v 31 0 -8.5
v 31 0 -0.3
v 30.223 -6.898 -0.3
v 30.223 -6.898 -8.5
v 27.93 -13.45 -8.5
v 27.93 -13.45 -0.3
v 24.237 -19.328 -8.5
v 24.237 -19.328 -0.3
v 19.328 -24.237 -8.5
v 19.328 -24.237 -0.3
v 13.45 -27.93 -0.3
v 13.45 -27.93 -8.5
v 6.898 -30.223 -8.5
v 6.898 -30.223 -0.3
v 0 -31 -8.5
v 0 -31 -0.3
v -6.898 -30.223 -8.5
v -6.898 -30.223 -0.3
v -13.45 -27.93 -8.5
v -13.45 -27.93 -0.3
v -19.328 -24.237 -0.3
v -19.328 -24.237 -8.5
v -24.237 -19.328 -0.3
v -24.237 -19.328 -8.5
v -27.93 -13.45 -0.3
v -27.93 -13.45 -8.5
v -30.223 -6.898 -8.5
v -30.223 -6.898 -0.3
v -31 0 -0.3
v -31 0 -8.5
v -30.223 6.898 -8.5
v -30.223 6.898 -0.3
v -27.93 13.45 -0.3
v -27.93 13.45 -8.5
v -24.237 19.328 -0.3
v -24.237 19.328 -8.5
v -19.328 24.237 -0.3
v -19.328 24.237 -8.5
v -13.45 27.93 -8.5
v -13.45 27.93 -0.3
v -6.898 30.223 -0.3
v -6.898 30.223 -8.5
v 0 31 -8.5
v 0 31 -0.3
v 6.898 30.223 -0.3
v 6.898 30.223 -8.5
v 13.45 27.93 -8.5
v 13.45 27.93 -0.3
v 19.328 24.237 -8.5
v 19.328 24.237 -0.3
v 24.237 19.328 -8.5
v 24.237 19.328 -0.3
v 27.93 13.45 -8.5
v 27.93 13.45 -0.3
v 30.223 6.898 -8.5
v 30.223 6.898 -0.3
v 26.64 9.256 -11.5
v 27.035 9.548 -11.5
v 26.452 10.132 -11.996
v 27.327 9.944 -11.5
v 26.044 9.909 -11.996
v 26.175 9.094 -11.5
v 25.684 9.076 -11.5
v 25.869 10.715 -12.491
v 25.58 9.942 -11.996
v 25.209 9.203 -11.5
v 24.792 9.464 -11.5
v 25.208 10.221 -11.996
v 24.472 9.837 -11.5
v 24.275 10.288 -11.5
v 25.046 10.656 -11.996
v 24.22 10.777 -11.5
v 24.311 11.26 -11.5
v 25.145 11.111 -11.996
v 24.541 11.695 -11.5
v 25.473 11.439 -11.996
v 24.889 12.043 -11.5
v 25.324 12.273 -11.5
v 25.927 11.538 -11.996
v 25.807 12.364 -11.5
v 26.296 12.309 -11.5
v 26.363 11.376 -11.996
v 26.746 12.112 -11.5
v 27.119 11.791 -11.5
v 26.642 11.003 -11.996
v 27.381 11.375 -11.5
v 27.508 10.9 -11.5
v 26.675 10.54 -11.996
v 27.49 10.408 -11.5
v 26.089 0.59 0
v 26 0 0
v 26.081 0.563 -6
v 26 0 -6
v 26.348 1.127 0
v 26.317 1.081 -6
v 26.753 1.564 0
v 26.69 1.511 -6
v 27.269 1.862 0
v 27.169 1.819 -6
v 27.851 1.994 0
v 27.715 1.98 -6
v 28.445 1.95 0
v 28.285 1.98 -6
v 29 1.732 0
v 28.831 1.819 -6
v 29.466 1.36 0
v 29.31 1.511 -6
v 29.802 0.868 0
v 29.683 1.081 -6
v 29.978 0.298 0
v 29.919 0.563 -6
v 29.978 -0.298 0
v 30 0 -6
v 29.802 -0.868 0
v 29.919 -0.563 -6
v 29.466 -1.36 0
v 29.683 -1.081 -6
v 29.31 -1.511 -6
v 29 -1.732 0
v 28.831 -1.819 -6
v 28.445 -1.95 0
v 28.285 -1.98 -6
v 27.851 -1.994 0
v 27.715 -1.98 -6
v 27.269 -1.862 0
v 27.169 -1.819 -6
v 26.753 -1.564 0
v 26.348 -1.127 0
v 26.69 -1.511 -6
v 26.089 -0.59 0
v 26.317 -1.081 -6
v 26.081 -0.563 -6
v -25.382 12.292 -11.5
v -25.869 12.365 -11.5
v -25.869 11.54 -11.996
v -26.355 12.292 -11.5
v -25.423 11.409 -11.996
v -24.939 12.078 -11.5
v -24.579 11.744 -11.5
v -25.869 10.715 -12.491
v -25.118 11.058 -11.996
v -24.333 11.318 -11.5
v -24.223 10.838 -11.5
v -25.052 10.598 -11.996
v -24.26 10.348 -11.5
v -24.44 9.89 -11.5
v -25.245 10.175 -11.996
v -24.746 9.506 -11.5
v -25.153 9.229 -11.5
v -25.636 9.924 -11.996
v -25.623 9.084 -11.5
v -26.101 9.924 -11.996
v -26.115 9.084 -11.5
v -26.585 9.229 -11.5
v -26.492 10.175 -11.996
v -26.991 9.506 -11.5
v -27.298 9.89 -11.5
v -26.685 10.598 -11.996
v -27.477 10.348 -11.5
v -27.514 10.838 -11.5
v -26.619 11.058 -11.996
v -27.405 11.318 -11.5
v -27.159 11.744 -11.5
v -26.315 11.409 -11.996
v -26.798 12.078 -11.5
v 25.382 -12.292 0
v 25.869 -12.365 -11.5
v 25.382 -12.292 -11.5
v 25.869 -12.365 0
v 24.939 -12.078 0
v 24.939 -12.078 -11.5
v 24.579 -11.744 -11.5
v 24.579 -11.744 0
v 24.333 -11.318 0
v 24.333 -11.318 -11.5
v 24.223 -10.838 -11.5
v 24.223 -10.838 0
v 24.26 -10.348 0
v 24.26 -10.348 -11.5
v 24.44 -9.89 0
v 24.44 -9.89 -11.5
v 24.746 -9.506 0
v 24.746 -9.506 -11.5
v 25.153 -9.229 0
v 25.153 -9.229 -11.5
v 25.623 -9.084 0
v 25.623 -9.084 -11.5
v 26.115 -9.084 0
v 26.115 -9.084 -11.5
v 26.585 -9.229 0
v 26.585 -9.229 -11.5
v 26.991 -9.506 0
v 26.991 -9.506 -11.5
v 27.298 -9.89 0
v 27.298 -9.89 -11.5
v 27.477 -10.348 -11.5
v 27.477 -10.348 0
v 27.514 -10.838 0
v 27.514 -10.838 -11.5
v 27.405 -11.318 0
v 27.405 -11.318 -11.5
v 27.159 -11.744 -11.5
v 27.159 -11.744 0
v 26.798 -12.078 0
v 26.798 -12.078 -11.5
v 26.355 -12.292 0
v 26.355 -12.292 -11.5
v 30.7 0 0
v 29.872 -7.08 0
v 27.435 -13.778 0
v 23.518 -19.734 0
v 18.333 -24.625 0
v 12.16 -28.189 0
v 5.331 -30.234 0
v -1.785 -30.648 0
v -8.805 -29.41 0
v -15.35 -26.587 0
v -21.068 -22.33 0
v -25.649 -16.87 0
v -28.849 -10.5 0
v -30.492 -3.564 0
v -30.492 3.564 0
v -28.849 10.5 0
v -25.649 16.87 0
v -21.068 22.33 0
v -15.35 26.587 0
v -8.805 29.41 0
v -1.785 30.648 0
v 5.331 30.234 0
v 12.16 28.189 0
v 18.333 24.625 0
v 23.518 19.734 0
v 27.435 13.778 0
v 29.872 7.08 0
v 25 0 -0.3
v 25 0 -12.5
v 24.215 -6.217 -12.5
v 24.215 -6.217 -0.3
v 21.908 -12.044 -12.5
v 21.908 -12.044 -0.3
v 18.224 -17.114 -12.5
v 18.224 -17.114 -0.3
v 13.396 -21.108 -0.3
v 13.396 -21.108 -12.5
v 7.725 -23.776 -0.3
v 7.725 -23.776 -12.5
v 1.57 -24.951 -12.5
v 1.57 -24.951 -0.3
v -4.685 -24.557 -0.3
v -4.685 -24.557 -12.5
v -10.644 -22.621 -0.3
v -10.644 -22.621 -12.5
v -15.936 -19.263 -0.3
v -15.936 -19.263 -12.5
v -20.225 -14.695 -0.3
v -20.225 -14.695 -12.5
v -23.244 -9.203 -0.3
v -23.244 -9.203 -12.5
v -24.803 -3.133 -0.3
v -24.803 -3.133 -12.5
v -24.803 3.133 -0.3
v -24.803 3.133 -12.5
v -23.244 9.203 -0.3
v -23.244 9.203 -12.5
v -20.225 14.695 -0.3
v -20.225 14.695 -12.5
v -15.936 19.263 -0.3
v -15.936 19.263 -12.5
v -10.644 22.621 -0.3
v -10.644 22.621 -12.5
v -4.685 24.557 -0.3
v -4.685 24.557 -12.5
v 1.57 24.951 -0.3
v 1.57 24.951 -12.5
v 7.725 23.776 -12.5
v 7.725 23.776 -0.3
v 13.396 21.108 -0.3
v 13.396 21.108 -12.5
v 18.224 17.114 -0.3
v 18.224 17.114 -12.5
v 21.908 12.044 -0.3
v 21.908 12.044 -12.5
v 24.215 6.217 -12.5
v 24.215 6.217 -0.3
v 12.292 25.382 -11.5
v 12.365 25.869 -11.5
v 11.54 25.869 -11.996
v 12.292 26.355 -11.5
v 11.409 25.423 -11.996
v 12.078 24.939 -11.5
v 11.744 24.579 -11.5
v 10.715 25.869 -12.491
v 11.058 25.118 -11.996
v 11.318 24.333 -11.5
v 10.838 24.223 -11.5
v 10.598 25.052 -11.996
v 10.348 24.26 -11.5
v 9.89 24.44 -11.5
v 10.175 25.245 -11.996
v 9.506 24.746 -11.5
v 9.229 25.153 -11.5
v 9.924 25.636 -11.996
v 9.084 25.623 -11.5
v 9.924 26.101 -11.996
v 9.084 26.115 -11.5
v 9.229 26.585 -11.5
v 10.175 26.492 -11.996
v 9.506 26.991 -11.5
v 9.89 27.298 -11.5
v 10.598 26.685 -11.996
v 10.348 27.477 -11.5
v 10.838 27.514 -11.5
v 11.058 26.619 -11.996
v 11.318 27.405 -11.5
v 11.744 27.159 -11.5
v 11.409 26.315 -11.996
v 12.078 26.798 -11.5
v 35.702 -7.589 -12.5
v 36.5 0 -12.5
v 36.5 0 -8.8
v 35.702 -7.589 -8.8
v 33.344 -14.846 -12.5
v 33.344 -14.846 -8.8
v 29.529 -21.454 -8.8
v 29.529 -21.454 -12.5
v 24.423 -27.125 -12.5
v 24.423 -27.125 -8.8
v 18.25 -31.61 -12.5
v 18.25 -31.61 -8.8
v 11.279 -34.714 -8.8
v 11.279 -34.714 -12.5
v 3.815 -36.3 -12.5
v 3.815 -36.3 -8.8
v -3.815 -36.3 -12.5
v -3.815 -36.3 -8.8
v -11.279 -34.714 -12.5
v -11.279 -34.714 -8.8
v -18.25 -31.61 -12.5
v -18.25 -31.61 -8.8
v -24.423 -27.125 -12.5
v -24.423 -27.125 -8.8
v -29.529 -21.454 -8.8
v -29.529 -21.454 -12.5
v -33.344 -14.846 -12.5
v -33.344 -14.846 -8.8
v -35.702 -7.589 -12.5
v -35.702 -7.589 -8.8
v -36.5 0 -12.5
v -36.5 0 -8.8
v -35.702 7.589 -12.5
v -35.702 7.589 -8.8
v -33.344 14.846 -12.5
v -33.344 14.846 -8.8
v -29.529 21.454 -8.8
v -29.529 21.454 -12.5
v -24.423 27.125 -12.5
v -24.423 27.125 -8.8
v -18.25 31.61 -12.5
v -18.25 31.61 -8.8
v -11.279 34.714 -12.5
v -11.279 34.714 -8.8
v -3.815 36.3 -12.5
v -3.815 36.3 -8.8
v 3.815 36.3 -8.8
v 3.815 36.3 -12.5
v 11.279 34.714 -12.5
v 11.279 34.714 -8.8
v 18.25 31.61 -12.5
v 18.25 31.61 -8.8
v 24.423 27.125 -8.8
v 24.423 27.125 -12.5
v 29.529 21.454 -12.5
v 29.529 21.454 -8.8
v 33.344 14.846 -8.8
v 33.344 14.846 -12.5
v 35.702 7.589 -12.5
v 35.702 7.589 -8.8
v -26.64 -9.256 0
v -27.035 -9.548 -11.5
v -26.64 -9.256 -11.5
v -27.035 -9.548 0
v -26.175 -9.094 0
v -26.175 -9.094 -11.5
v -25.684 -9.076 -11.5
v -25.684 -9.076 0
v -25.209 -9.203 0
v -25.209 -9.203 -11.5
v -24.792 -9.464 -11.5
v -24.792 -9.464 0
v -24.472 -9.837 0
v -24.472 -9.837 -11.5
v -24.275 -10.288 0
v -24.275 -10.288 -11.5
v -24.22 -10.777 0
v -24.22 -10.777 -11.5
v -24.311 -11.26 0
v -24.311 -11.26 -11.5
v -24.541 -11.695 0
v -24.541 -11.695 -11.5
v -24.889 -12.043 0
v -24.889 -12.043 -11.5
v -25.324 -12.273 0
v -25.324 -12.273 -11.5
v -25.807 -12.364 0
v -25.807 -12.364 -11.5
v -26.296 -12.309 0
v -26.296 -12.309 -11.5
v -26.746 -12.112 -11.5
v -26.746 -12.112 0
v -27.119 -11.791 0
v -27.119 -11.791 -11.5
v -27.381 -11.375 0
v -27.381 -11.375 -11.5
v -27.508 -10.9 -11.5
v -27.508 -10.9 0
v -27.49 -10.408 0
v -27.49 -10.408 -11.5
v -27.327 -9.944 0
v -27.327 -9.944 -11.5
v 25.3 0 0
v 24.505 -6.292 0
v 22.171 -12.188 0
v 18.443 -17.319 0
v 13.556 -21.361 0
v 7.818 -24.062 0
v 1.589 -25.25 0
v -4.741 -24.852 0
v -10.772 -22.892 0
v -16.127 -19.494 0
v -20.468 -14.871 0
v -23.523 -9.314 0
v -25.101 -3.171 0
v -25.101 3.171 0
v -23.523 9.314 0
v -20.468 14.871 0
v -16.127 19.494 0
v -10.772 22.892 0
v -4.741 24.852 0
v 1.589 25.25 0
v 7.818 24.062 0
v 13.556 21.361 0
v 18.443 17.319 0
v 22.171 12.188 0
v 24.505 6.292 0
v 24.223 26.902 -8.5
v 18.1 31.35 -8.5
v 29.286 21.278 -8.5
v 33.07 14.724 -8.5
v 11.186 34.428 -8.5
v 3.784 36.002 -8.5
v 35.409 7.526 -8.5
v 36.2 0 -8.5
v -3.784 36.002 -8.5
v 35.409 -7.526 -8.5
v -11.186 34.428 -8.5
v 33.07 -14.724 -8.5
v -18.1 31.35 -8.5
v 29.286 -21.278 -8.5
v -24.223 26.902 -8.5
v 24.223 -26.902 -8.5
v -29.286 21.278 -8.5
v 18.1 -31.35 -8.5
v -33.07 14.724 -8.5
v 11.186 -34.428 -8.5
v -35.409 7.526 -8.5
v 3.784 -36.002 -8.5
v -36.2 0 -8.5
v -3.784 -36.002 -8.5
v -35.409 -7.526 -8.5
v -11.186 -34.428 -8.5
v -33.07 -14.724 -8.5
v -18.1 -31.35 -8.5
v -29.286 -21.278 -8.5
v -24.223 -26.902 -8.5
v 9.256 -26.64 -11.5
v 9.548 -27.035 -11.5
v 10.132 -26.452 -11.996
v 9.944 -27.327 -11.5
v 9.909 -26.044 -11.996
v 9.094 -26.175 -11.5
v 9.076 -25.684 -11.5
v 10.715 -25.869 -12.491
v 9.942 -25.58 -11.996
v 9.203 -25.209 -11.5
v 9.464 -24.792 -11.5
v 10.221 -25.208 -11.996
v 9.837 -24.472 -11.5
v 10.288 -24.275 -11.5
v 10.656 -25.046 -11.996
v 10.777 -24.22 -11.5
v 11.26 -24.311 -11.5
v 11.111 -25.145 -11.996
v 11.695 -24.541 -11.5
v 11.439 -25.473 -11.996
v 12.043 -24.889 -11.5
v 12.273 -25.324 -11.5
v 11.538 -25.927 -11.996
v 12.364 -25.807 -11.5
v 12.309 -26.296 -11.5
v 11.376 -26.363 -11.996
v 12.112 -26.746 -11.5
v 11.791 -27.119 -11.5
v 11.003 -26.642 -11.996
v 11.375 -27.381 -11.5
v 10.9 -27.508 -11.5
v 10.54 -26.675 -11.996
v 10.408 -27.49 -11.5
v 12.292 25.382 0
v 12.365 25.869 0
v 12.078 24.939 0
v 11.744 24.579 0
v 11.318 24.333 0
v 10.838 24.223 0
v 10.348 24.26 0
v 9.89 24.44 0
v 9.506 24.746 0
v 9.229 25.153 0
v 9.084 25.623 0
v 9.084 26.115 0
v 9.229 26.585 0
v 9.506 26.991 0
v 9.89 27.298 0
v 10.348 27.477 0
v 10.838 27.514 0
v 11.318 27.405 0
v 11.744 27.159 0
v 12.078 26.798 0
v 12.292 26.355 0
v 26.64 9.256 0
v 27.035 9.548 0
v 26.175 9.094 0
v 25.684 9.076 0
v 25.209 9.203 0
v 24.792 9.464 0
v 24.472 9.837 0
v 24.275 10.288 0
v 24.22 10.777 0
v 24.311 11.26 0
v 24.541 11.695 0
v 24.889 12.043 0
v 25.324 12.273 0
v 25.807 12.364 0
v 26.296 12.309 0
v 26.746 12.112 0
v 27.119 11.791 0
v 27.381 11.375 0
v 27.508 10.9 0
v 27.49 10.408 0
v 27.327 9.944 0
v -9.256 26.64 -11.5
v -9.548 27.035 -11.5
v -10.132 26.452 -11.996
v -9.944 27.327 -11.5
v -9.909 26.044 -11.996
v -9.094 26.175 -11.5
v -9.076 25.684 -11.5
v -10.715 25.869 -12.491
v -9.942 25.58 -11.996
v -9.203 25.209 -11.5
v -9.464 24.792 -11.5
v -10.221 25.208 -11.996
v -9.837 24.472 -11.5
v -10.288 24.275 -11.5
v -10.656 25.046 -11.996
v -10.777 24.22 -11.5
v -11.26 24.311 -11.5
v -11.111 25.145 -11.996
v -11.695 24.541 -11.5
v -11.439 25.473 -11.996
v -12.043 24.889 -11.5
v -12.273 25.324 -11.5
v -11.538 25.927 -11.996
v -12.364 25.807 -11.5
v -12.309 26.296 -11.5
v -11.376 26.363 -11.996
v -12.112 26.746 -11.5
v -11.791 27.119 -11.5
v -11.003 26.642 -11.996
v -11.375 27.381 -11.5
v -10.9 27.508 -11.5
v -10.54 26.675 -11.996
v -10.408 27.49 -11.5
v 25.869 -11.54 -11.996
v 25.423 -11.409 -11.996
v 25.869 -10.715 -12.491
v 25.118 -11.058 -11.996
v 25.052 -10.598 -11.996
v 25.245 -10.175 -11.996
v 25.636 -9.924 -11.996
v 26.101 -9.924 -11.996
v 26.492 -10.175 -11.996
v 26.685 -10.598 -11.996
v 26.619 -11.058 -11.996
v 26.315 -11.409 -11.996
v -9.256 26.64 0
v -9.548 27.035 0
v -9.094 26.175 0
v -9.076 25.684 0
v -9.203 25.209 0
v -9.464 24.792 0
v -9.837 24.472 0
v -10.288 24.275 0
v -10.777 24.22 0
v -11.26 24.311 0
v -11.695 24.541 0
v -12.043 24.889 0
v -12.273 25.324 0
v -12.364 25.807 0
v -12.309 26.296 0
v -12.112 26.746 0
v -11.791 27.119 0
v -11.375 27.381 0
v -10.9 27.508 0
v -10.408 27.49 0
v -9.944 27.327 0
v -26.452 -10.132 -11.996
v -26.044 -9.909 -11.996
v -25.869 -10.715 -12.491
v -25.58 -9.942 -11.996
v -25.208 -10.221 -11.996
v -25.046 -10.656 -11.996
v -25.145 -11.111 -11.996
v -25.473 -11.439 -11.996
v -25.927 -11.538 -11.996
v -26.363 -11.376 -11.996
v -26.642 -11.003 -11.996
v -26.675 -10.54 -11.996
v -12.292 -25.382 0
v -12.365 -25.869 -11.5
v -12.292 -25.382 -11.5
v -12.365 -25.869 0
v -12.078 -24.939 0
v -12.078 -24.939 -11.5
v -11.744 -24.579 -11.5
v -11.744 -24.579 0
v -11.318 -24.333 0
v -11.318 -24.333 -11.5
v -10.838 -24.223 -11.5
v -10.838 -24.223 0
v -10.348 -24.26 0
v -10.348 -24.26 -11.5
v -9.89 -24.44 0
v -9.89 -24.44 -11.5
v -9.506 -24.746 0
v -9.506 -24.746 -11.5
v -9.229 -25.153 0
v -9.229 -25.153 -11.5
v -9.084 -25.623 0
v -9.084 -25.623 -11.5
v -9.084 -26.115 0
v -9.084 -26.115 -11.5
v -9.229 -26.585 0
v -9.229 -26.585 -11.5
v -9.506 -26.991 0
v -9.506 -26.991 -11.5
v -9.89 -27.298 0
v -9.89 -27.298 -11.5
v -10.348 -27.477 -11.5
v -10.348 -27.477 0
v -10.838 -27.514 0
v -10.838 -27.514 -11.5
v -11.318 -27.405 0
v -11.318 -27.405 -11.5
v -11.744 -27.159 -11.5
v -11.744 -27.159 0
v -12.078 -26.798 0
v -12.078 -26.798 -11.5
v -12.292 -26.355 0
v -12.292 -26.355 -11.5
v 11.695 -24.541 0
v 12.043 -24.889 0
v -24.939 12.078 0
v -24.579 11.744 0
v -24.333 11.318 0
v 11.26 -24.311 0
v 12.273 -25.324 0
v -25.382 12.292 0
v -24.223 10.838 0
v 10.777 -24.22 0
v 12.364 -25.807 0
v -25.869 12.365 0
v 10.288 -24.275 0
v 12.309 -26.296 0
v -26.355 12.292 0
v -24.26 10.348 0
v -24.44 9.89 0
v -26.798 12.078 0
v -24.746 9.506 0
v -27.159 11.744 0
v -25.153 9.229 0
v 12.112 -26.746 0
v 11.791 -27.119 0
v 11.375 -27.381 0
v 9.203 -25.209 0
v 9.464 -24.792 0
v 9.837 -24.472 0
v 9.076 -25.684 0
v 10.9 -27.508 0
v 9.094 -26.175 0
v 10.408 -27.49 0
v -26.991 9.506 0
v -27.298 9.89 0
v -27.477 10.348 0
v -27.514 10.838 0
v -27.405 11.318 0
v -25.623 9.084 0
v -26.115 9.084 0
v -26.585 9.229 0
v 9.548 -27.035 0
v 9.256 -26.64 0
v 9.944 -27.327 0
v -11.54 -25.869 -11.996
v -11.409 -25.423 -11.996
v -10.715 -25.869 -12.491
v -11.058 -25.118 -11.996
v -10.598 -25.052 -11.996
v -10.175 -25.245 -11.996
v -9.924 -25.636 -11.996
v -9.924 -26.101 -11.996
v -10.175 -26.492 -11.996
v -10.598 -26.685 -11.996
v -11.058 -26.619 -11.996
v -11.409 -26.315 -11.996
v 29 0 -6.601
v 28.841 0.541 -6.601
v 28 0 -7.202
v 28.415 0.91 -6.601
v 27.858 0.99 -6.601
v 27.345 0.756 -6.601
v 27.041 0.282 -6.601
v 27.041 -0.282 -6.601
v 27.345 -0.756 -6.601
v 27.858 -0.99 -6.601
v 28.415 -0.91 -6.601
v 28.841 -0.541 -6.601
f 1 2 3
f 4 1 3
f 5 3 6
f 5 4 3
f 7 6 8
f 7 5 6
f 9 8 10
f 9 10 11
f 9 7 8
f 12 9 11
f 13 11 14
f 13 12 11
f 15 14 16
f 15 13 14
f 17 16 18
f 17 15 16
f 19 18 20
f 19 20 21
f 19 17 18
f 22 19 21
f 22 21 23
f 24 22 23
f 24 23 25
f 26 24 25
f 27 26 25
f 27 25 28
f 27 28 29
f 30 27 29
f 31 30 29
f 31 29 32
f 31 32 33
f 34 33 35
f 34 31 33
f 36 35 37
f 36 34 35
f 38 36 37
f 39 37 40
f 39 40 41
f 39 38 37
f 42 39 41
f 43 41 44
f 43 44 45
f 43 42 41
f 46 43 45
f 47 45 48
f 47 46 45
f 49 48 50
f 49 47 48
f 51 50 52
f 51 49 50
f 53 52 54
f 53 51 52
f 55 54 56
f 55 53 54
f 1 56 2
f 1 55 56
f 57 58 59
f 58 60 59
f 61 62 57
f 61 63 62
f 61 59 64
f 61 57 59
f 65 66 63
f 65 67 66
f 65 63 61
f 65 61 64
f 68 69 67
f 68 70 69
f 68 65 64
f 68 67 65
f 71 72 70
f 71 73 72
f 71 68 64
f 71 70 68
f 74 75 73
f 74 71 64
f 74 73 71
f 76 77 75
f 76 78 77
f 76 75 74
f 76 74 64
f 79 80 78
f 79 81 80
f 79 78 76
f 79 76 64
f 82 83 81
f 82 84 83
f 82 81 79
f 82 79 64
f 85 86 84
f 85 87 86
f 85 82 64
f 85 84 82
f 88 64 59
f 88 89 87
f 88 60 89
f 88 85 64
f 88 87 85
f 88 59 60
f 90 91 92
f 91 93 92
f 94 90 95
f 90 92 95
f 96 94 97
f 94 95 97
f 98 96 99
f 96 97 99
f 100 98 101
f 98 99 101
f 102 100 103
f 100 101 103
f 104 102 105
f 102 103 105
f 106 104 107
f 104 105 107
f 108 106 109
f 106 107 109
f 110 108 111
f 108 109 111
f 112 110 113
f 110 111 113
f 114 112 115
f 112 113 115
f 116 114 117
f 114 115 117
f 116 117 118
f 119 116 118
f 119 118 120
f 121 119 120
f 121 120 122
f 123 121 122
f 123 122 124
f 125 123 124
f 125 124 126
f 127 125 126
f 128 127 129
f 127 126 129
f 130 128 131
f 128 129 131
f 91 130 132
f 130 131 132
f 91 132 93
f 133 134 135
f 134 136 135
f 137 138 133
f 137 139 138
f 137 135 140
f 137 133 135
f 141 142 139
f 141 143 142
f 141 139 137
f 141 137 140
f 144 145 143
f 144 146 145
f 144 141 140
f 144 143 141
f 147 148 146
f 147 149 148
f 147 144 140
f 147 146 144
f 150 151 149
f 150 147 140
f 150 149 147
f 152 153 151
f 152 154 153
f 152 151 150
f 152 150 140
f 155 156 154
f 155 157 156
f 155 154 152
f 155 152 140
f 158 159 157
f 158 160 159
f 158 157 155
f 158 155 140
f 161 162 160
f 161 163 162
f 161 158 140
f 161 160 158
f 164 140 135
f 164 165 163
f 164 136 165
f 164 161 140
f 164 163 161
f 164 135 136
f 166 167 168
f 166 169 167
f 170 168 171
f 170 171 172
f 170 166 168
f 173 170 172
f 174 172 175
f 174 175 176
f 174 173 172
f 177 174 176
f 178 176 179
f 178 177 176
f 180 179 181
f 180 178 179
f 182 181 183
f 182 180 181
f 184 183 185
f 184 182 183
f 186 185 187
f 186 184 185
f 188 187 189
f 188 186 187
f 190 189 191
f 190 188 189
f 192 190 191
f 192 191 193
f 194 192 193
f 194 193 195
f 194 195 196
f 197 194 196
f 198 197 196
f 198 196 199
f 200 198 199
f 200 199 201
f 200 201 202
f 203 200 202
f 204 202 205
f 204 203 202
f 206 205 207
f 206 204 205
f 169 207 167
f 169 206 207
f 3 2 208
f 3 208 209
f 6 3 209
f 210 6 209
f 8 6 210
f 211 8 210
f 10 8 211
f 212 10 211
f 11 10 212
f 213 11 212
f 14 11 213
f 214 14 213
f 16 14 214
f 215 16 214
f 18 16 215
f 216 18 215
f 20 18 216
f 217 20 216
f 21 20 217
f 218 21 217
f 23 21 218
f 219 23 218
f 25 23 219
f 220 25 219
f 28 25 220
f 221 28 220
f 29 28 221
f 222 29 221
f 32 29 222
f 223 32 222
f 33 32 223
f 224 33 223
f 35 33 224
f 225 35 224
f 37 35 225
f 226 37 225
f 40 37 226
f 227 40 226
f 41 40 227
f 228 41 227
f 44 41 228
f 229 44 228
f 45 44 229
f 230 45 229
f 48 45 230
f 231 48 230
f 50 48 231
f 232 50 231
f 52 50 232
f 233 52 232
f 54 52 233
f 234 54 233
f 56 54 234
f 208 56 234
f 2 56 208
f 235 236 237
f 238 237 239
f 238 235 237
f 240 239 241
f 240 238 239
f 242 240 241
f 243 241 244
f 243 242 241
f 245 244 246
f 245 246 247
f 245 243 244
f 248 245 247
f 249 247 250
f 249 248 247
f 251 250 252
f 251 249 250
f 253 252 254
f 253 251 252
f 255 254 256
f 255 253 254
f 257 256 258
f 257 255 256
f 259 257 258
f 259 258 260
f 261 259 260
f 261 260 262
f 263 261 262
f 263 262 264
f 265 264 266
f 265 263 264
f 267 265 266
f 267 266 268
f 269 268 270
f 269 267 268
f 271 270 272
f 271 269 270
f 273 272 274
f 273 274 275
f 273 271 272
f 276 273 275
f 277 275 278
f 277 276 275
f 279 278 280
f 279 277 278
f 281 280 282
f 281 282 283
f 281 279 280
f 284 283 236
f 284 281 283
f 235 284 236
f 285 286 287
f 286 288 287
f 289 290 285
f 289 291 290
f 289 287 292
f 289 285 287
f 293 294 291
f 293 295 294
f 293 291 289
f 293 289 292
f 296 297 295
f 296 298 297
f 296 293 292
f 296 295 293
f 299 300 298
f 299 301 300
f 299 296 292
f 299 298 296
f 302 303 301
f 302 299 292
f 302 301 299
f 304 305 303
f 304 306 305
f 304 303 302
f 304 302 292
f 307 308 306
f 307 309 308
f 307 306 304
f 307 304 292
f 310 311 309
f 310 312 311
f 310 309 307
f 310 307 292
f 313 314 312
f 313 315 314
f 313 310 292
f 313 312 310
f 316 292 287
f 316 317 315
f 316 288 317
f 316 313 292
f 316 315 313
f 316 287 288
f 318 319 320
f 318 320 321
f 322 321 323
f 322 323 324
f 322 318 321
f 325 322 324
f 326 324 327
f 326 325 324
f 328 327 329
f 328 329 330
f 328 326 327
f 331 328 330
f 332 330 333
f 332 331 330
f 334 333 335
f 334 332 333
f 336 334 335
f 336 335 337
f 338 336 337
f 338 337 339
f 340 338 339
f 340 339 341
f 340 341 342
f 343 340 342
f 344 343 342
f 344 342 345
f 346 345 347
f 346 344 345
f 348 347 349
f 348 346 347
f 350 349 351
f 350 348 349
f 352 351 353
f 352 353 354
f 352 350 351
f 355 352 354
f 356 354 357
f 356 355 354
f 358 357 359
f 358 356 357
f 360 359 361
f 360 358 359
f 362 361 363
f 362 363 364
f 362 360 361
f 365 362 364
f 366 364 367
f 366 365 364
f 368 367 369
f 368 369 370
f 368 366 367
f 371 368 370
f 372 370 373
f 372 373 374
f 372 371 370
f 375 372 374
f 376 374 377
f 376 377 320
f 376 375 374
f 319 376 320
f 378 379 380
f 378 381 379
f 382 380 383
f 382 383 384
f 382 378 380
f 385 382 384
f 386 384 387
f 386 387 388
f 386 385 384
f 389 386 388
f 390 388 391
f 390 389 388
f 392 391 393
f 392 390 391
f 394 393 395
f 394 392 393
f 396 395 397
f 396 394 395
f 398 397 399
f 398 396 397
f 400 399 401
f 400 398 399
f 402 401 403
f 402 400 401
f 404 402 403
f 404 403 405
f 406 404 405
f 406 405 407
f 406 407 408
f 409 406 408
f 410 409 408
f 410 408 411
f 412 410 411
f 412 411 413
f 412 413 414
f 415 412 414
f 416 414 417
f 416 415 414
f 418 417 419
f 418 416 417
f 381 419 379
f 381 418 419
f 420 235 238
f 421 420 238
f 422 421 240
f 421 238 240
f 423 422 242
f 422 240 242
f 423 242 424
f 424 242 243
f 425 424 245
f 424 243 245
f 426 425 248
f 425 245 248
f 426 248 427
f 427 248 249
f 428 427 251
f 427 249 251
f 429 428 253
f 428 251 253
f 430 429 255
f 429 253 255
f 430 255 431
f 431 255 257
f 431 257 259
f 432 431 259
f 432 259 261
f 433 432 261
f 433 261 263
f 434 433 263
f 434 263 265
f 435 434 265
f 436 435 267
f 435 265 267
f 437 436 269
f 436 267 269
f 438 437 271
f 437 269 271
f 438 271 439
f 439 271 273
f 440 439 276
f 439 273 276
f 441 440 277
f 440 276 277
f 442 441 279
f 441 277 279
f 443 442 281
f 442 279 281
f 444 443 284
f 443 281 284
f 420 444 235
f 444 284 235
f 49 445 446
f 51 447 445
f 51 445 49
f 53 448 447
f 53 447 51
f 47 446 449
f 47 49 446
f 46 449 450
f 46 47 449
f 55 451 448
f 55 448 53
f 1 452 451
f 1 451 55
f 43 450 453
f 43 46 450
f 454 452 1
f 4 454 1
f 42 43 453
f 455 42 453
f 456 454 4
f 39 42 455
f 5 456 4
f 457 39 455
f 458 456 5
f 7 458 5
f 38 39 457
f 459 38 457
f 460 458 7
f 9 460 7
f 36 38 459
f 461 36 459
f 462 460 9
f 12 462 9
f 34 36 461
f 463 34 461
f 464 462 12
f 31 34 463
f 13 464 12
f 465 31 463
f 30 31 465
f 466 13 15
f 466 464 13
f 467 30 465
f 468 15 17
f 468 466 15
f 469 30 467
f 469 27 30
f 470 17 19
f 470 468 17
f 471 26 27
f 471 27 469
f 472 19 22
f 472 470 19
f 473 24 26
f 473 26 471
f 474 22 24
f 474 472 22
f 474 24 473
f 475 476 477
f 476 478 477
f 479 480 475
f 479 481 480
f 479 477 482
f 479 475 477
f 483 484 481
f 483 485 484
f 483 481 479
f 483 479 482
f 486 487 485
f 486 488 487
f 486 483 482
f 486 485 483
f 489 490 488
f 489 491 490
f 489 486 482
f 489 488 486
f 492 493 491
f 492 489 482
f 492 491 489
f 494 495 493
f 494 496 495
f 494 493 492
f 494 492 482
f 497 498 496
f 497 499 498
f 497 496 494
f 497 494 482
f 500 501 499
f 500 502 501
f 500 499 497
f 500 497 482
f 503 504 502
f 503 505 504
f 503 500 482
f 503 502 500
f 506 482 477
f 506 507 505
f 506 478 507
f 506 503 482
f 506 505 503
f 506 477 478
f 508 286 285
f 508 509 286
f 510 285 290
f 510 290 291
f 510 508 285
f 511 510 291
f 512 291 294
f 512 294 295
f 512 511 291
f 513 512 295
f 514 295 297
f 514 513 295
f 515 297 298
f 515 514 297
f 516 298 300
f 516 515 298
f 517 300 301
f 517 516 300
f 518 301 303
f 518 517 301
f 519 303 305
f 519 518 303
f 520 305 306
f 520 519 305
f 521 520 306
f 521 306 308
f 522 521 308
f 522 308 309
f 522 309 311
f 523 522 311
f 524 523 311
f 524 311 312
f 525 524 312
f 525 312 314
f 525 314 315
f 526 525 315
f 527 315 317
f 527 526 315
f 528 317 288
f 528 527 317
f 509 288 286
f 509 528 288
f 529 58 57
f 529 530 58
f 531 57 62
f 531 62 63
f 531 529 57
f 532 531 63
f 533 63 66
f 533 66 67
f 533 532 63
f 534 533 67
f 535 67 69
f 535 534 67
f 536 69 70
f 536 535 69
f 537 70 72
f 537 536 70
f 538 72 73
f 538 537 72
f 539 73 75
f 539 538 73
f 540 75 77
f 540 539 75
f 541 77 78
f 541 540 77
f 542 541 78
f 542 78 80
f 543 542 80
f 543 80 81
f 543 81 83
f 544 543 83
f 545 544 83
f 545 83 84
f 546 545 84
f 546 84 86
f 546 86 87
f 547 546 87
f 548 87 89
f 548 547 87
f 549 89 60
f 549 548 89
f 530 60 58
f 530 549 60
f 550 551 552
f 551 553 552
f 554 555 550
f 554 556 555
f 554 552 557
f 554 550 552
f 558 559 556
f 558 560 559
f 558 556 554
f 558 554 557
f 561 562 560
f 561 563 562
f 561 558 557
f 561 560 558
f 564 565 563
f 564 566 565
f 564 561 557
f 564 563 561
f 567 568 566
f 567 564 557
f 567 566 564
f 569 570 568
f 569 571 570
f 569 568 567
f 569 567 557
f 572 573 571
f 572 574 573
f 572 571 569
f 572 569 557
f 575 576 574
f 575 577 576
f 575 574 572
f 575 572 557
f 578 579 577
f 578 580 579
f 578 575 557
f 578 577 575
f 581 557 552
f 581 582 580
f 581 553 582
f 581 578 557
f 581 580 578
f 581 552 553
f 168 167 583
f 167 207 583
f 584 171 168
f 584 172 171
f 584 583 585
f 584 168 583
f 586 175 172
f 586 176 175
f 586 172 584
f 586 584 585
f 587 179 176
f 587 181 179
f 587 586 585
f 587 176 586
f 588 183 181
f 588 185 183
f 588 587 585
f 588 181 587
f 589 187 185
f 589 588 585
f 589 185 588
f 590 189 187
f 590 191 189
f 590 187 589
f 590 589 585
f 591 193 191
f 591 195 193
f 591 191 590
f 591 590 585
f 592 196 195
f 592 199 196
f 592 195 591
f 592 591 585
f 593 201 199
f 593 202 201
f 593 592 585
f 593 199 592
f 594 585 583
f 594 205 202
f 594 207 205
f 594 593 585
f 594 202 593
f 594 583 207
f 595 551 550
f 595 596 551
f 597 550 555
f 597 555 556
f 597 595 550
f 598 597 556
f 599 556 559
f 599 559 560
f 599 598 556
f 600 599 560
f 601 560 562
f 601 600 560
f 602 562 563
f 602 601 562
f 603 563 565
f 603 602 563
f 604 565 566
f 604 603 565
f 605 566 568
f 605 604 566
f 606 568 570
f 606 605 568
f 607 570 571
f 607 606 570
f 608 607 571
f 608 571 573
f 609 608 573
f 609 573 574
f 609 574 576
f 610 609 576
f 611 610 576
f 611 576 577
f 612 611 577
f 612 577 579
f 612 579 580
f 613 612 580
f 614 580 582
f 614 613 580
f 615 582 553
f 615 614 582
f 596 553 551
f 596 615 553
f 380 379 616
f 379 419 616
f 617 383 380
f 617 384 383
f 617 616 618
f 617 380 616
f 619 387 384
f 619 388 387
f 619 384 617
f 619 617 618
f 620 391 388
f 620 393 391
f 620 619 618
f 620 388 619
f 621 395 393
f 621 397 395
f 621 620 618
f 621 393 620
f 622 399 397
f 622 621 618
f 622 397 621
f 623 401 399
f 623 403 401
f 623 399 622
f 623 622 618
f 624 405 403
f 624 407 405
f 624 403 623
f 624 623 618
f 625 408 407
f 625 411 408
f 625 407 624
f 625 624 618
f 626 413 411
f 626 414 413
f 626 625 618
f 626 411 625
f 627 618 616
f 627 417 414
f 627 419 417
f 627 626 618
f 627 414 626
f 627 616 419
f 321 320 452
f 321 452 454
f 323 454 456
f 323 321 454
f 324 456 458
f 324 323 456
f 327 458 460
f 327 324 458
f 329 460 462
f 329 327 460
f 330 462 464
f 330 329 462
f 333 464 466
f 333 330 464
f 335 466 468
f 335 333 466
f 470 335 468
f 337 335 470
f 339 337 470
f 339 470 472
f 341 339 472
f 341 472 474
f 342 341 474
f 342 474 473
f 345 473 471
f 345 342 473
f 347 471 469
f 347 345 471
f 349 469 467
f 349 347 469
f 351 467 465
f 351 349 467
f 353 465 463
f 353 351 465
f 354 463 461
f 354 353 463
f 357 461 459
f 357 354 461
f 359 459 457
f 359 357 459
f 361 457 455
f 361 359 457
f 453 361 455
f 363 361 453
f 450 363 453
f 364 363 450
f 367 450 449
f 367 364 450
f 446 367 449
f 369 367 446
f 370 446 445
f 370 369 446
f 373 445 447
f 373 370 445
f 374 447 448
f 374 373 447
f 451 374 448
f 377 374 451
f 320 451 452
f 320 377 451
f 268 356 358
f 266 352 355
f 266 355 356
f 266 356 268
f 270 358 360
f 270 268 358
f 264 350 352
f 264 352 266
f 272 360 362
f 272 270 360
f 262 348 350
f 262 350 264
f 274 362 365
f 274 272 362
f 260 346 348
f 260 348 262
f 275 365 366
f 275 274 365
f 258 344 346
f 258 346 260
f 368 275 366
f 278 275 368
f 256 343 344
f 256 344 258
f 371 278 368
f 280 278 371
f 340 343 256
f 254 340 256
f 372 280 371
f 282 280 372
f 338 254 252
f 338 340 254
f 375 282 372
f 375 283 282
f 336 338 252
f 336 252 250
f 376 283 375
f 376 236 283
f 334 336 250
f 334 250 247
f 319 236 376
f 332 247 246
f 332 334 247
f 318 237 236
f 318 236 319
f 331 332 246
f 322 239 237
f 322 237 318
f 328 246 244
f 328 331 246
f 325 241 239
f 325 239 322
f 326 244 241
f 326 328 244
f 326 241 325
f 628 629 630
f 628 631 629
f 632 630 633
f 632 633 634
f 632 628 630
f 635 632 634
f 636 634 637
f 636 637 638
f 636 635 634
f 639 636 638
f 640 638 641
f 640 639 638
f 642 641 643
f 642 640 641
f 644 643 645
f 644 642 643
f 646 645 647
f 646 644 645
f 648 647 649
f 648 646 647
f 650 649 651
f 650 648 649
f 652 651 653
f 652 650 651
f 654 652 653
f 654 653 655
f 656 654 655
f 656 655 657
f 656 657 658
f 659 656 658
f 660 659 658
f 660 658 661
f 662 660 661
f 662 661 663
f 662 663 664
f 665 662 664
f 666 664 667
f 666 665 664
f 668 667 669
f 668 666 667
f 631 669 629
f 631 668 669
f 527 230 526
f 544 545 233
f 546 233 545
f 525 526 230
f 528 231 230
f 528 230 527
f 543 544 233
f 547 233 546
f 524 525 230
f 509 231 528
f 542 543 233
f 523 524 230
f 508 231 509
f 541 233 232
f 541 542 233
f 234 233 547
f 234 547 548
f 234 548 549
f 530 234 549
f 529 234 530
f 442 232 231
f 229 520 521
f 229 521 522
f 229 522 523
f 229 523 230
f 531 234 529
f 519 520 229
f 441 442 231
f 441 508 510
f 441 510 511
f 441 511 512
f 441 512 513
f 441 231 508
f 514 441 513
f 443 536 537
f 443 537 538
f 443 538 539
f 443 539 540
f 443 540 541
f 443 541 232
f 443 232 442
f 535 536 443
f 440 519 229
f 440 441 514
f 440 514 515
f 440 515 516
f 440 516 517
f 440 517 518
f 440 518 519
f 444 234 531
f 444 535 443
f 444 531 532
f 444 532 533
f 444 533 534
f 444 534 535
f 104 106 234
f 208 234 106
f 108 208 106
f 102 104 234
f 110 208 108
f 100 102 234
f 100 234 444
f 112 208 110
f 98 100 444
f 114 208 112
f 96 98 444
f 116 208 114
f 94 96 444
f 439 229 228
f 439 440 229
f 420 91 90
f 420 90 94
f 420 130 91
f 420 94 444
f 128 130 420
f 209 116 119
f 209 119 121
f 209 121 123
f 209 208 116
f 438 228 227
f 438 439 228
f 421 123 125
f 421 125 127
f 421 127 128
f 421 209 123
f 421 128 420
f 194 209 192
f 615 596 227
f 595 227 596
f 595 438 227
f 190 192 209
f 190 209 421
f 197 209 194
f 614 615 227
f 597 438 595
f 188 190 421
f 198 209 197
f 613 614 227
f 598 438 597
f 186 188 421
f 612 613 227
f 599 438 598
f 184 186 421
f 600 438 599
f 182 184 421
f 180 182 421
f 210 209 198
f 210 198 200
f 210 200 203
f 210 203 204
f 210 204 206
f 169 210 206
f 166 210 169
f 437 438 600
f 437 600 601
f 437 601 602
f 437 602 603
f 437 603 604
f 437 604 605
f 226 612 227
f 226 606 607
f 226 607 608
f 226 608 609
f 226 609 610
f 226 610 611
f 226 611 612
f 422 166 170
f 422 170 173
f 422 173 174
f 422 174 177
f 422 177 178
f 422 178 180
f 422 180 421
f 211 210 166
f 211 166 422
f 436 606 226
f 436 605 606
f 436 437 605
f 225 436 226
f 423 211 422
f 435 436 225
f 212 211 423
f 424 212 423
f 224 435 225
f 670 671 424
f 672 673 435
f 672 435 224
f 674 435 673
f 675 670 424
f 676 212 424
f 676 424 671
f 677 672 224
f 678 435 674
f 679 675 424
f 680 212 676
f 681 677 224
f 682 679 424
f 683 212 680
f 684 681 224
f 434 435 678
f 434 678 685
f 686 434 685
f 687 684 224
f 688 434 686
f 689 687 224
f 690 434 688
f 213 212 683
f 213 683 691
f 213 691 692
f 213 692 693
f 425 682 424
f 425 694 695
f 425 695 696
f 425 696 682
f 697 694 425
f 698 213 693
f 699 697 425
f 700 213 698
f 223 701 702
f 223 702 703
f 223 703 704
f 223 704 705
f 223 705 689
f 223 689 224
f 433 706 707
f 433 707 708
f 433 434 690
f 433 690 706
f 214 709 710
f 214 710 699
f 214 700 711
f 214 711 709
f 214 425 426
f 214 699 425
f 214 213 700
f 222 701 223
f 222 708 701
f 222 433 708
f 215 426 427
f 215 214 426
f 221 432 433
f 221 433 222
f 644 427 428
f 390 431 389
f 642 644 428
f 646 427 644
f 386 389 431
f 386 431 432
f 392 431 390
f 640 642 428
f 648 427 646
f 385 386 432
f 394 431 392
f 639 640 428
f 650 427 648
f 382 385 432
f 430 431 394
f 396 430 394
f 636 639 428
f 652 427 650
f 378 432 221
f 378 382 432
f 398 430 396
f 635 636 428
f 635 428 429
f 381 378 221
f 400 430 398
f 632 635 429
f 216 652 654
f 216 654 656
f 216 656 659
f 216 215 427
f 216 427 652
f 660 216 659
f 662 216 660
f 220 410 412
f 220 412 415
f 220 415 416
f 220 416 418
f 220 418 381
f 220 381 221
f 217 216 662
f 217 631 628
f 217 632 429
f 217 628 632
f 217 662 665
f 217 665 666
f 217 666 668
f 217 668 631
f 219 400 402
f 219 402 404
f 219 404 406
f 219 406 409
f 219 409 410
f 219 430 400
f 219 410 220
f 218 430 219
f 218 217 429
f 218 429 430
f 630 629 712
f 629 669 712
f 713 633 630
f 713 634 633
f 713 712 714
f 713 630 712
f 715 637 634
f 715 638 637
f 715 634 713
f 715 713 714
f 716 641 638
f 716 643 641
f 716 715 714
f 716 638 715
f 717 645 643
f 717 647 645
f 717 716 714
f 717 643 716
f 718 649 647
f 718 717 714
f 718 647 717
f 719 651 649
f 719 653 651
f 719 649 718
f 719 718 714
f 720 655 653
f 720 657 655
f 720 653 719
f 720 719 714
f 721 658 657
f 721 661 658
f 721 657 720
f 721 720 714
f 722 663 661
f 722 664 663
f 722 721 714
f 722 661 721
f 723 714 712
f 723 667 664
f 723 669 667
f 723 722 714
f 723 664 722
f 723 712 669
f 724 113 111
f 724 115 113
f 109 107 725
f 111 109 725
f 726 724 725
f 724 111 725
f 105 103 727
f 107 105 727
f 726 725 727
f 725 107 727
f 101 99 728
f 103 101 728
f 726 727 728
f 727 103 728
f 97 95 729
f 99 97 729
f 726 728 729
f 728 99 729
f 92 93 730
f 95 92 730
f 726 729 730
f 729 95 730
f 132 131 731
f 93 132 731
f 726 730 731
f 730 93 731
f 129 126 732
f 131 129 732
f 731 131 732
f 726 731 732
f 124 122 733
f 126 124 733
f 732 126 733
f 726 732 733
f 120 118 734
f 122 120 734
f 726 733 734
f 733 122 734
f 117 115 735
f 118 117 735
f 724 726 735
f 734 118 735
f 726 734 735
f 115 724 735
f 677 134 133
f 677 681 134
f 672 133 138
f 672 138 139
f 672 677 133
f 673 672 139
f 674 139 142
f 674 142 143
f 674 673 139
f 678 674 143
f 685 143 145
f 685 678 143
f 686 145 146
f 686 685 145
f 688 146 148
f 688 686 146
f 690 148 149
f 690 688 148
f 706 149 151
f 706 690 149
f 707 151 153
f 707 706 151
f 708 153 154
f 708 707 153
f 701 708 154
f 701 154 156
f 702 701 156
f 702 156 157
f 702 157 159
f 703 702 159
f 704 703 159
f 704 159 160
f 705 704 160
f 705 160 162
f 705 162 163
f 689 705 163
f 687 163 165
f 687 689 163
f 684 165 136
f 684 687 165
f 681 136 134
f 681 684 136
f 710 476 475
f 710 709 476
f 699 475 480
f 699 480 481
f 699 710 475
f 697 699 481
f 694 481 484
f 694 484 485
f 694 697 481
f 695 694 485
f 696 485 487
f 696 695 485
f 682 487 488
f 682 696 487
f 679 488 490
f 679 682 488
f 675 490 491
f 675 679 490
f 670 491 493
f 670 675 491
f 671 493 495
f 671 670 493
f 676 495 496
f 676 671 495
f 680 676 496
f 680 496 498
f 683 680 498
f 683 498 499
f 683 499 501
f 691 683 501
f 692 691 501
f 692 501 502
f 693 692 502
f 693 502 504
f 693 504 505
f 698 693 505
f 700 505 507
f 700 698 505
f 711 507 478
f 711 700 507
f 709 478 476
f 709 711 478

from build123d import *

# Parameters (mm, degrees)
CHAMFER1_SIZE             = 0.3
F_4_000_X_6_0_DOWEL_D     = 4
F_4_000_X_6_0_DOWEL_DEPTH = 6
F_4_000_X_6_0_DOWEL_TIP   = 1.201721238
CIRPATTERN1_COUNT         = 8


with BuildPart() as part:
    # Sketch1 → Revolve1 (revolve)
    with BuildSketch(Plane(origin=(0, 0, 0), x_dir=(1, 0, 0), z_dir=(0, 1, 0))):
        Polygon((25, 0), (31, 0), (31, 8.5), (36.5, 8.5), (36.5, 12.5), (25, 12.5), align=None)
    revolve(axis=Axis((0, 0, 0), (0, 0, -1)))

    # Chamfer1
    chamfer1_edges = [part.edges().sort_by_distance(p)[0] for p in [
        (-36.5, 0, -8.5),
        (-25, 0, 0),
        (-31, 0, 0),
    ]]
    chamfer(chamfer1_edges, length=CHAMFER1_SIZE)

    # Ø4.000 x 6.0 Dowel
    with Locations(Plane.XY):
        with Locations((28, 0)):
            Hole(F_4_000_X_6_0_DOWEL_D / 2, depth=F_4_000_X_6_0_DOWEL_DEPTH)
            with Locations((0, 0, -(F_4_000_X_6_0_DOWEL_DEPTH + F_4_000_X_6_0_DOWEL_TIP / 2))):  # 118° drill point
                Cone(0, F_4_000_X_6_0_DOWEL_D / 2, F_4_000_X_6_0_DOWEL_TIP, mode=Mode.SUBTRACT)

    # Sketch5 → M4x0.7 x 6.0 Tapped Hole (revolve, cut)
    with BuildSketch(Plane(origin=(25.86862691, -10.715136106, 0), x_dir=(0, -1, 0), z_dir=(1, 0, 0))):
        Polygon((0, 0), (0, 12.491420021), (1.65, 11.5), (1.65, 0), align=None)
    m4x0_7_x_6_0_tapped_hole = revolve(axis=Axis((25.86862691, -10.715136106, 6.35), (0, 0, -1)), mode=Mode.SUBTRACT)

    # CirPattern1: M4x0.7 x 6.0 Tapped Hole ×8 about axis
    cirpattern1_axis = Axis((0, 0, 0), (0, 0, 1))
    for i in range(1, CIRPATTERN1_COUNT):
        add(m4x0_7_x_6_0_tapped_hole.rotate(cirpattern1_axis, i * 360 / CIRPATTERN1_COUNT), mode=Mode.SUBTRACT)


solid = part.part
